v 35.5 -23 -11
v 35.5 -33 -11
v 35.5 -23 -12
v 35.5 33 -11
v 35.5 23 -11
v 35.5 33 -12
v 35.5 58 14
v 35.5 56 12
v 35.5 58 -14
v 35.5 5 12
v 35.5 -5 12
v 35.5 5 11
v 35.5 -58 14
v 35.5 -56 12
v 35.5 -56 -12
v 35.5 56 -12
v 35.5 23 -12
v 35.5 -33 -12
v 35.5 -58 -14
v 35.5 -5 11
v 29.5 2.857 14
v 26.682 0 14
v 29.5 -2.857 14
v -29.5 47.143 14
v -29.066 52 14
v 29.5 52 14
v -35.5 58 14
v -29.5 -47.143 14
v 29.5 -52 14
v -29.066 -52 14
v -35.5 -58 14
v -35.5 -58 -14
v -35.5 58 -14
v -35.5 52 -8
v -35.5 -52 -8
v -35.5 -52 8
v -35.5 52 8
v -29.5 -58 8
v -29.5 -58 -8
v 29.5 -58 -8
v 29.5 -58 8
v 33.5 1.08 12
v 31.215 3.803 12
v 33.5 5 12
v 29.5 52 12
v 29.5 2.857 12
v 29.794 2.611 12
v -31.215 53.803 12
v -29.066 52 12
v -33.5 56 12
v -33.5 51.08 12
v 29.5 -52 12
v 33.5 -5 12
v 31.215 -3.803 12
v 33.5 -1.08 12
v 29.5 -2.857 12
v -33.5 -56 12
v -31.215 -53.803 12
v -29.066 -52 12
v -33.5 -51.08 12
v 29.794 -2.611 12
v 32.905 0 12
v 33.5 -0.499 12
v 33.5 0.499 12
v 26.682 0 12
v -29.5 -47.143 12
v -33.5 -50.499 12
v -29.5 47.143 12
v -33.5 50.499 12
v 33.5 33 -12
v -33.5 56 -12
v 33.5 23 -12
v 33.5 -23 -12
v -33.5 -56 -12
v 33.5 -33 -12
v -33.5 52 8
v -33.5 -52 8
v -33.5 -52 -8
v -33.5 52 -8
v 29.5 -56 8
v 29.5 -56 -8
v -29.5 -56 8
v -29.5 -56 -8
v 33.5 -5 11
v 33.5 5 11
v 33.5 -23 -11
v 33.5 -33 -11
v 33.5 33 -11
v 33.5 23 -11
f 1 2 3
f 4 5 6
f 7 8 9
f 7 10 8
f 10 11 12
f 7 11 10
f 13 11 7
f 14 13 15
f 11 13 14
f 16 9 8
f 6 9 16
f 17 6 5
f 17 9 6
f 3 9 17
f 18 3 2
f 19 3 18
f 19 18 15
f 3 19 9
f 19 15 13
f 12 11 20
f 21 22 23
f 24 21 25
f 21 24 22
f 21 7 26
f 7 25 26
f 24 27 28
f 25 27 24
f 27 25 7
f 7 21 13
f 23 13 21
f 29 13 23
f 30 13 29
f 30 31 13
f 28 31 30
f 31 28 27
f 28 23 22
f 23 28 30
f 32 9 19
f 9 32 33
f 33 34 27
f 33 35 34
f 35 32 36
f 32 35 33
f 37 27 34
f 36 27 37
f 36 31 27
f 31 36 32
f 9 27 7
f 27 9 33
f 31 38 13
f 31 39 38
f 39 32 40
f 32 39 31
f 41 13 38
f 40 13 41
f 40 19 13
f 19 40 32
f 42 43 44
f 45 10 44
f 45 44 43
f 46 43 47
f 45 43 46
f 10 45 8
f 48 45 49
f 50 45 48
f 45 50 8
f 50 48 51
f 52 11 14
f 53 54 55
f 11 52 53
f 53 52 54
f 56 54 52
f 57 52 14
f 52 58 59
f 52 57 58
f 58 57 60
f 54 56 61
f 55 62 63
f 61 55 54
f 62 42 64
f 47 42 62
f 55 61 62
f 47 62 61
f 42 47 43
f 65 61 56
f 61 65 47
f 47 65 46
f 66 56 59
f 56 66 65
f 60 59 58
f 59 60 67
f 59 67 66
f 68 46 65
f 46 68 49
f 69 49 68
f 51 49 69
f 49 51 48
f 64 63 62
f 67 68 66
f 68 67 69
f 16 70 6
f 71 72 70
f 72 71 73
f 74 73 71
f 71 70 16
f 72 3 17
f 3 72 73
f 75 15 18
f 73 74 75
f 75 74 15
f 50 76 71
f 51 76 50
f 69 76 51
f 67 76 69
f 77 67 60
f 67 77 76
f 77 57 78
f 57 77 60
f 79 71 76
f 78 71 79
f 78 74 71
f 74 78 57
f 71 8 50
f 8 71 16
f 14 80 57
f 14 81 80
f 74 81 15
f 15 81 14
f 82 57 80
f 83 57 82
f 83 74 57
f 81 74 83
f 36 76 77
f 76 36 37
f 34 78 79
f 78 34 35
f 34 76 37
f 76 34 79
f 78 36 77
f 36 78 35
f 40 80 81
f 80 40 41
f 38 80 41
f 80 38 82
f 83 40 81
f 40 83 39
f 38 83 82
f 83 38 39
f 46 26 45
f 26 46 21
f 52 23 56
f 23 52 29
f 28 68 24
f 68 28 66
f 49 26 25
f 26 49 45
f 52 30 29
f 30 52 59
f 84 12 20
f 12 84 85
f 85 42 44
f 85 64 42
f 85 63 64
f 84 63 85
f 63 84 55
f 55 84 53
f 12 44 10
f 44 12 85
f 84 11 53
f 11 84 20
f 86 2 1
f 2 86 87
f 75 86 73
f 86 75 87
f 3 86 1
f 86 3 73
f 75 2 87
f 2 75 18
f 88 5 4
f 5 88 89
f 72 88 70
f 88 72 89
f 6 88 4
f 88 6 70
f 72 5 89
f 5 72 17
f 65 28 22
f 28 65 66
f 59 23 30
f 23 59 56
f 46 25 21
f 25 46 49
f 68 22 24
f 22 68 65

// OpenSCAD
difference() {
    cube([67 + 2 * 2, 112 + 2 * 2, 24 + 2 * 2], center=true);
    cube([67, 112, 24], center=true);

    translate([4, 0, 0]) cube([67, 112, 24], center=true);
    translate([-4, 0, 0]) cube([67, 112 - 2 * 4, 24 - 2 * 4], center=true);
    translate([0, -4, 0]) cube([67 - 2 * 4, 112, 24 - 2 * 4], center=true);
    translate([0, 0, 4]) cube([67 - 2 * 4, 112 - 2 * 4, 24], center=true);

}
translate([67 / 2 + 1, 0, 24 / 2]) cube([2, 10, 2], center=true);
translate([67 / 2 + 1, -112 / 4, -24 / 2]) cube([2, 10, 2], center=true);
translate([67 / 2 + 1, 112 / 4, -24 / 2]) cube([2, 10, 2], center=true);

translate([0, -25, 24 / 2 + 1]) rotate([0, 0, 40]) cube([60 * sqrt(2), 4, 2], center=true);
translate([0, 25, 24 / 2 + 1]) rotate([0, 0, -40]) cube([60 * sqrt(2), 4, 2], center=true);
